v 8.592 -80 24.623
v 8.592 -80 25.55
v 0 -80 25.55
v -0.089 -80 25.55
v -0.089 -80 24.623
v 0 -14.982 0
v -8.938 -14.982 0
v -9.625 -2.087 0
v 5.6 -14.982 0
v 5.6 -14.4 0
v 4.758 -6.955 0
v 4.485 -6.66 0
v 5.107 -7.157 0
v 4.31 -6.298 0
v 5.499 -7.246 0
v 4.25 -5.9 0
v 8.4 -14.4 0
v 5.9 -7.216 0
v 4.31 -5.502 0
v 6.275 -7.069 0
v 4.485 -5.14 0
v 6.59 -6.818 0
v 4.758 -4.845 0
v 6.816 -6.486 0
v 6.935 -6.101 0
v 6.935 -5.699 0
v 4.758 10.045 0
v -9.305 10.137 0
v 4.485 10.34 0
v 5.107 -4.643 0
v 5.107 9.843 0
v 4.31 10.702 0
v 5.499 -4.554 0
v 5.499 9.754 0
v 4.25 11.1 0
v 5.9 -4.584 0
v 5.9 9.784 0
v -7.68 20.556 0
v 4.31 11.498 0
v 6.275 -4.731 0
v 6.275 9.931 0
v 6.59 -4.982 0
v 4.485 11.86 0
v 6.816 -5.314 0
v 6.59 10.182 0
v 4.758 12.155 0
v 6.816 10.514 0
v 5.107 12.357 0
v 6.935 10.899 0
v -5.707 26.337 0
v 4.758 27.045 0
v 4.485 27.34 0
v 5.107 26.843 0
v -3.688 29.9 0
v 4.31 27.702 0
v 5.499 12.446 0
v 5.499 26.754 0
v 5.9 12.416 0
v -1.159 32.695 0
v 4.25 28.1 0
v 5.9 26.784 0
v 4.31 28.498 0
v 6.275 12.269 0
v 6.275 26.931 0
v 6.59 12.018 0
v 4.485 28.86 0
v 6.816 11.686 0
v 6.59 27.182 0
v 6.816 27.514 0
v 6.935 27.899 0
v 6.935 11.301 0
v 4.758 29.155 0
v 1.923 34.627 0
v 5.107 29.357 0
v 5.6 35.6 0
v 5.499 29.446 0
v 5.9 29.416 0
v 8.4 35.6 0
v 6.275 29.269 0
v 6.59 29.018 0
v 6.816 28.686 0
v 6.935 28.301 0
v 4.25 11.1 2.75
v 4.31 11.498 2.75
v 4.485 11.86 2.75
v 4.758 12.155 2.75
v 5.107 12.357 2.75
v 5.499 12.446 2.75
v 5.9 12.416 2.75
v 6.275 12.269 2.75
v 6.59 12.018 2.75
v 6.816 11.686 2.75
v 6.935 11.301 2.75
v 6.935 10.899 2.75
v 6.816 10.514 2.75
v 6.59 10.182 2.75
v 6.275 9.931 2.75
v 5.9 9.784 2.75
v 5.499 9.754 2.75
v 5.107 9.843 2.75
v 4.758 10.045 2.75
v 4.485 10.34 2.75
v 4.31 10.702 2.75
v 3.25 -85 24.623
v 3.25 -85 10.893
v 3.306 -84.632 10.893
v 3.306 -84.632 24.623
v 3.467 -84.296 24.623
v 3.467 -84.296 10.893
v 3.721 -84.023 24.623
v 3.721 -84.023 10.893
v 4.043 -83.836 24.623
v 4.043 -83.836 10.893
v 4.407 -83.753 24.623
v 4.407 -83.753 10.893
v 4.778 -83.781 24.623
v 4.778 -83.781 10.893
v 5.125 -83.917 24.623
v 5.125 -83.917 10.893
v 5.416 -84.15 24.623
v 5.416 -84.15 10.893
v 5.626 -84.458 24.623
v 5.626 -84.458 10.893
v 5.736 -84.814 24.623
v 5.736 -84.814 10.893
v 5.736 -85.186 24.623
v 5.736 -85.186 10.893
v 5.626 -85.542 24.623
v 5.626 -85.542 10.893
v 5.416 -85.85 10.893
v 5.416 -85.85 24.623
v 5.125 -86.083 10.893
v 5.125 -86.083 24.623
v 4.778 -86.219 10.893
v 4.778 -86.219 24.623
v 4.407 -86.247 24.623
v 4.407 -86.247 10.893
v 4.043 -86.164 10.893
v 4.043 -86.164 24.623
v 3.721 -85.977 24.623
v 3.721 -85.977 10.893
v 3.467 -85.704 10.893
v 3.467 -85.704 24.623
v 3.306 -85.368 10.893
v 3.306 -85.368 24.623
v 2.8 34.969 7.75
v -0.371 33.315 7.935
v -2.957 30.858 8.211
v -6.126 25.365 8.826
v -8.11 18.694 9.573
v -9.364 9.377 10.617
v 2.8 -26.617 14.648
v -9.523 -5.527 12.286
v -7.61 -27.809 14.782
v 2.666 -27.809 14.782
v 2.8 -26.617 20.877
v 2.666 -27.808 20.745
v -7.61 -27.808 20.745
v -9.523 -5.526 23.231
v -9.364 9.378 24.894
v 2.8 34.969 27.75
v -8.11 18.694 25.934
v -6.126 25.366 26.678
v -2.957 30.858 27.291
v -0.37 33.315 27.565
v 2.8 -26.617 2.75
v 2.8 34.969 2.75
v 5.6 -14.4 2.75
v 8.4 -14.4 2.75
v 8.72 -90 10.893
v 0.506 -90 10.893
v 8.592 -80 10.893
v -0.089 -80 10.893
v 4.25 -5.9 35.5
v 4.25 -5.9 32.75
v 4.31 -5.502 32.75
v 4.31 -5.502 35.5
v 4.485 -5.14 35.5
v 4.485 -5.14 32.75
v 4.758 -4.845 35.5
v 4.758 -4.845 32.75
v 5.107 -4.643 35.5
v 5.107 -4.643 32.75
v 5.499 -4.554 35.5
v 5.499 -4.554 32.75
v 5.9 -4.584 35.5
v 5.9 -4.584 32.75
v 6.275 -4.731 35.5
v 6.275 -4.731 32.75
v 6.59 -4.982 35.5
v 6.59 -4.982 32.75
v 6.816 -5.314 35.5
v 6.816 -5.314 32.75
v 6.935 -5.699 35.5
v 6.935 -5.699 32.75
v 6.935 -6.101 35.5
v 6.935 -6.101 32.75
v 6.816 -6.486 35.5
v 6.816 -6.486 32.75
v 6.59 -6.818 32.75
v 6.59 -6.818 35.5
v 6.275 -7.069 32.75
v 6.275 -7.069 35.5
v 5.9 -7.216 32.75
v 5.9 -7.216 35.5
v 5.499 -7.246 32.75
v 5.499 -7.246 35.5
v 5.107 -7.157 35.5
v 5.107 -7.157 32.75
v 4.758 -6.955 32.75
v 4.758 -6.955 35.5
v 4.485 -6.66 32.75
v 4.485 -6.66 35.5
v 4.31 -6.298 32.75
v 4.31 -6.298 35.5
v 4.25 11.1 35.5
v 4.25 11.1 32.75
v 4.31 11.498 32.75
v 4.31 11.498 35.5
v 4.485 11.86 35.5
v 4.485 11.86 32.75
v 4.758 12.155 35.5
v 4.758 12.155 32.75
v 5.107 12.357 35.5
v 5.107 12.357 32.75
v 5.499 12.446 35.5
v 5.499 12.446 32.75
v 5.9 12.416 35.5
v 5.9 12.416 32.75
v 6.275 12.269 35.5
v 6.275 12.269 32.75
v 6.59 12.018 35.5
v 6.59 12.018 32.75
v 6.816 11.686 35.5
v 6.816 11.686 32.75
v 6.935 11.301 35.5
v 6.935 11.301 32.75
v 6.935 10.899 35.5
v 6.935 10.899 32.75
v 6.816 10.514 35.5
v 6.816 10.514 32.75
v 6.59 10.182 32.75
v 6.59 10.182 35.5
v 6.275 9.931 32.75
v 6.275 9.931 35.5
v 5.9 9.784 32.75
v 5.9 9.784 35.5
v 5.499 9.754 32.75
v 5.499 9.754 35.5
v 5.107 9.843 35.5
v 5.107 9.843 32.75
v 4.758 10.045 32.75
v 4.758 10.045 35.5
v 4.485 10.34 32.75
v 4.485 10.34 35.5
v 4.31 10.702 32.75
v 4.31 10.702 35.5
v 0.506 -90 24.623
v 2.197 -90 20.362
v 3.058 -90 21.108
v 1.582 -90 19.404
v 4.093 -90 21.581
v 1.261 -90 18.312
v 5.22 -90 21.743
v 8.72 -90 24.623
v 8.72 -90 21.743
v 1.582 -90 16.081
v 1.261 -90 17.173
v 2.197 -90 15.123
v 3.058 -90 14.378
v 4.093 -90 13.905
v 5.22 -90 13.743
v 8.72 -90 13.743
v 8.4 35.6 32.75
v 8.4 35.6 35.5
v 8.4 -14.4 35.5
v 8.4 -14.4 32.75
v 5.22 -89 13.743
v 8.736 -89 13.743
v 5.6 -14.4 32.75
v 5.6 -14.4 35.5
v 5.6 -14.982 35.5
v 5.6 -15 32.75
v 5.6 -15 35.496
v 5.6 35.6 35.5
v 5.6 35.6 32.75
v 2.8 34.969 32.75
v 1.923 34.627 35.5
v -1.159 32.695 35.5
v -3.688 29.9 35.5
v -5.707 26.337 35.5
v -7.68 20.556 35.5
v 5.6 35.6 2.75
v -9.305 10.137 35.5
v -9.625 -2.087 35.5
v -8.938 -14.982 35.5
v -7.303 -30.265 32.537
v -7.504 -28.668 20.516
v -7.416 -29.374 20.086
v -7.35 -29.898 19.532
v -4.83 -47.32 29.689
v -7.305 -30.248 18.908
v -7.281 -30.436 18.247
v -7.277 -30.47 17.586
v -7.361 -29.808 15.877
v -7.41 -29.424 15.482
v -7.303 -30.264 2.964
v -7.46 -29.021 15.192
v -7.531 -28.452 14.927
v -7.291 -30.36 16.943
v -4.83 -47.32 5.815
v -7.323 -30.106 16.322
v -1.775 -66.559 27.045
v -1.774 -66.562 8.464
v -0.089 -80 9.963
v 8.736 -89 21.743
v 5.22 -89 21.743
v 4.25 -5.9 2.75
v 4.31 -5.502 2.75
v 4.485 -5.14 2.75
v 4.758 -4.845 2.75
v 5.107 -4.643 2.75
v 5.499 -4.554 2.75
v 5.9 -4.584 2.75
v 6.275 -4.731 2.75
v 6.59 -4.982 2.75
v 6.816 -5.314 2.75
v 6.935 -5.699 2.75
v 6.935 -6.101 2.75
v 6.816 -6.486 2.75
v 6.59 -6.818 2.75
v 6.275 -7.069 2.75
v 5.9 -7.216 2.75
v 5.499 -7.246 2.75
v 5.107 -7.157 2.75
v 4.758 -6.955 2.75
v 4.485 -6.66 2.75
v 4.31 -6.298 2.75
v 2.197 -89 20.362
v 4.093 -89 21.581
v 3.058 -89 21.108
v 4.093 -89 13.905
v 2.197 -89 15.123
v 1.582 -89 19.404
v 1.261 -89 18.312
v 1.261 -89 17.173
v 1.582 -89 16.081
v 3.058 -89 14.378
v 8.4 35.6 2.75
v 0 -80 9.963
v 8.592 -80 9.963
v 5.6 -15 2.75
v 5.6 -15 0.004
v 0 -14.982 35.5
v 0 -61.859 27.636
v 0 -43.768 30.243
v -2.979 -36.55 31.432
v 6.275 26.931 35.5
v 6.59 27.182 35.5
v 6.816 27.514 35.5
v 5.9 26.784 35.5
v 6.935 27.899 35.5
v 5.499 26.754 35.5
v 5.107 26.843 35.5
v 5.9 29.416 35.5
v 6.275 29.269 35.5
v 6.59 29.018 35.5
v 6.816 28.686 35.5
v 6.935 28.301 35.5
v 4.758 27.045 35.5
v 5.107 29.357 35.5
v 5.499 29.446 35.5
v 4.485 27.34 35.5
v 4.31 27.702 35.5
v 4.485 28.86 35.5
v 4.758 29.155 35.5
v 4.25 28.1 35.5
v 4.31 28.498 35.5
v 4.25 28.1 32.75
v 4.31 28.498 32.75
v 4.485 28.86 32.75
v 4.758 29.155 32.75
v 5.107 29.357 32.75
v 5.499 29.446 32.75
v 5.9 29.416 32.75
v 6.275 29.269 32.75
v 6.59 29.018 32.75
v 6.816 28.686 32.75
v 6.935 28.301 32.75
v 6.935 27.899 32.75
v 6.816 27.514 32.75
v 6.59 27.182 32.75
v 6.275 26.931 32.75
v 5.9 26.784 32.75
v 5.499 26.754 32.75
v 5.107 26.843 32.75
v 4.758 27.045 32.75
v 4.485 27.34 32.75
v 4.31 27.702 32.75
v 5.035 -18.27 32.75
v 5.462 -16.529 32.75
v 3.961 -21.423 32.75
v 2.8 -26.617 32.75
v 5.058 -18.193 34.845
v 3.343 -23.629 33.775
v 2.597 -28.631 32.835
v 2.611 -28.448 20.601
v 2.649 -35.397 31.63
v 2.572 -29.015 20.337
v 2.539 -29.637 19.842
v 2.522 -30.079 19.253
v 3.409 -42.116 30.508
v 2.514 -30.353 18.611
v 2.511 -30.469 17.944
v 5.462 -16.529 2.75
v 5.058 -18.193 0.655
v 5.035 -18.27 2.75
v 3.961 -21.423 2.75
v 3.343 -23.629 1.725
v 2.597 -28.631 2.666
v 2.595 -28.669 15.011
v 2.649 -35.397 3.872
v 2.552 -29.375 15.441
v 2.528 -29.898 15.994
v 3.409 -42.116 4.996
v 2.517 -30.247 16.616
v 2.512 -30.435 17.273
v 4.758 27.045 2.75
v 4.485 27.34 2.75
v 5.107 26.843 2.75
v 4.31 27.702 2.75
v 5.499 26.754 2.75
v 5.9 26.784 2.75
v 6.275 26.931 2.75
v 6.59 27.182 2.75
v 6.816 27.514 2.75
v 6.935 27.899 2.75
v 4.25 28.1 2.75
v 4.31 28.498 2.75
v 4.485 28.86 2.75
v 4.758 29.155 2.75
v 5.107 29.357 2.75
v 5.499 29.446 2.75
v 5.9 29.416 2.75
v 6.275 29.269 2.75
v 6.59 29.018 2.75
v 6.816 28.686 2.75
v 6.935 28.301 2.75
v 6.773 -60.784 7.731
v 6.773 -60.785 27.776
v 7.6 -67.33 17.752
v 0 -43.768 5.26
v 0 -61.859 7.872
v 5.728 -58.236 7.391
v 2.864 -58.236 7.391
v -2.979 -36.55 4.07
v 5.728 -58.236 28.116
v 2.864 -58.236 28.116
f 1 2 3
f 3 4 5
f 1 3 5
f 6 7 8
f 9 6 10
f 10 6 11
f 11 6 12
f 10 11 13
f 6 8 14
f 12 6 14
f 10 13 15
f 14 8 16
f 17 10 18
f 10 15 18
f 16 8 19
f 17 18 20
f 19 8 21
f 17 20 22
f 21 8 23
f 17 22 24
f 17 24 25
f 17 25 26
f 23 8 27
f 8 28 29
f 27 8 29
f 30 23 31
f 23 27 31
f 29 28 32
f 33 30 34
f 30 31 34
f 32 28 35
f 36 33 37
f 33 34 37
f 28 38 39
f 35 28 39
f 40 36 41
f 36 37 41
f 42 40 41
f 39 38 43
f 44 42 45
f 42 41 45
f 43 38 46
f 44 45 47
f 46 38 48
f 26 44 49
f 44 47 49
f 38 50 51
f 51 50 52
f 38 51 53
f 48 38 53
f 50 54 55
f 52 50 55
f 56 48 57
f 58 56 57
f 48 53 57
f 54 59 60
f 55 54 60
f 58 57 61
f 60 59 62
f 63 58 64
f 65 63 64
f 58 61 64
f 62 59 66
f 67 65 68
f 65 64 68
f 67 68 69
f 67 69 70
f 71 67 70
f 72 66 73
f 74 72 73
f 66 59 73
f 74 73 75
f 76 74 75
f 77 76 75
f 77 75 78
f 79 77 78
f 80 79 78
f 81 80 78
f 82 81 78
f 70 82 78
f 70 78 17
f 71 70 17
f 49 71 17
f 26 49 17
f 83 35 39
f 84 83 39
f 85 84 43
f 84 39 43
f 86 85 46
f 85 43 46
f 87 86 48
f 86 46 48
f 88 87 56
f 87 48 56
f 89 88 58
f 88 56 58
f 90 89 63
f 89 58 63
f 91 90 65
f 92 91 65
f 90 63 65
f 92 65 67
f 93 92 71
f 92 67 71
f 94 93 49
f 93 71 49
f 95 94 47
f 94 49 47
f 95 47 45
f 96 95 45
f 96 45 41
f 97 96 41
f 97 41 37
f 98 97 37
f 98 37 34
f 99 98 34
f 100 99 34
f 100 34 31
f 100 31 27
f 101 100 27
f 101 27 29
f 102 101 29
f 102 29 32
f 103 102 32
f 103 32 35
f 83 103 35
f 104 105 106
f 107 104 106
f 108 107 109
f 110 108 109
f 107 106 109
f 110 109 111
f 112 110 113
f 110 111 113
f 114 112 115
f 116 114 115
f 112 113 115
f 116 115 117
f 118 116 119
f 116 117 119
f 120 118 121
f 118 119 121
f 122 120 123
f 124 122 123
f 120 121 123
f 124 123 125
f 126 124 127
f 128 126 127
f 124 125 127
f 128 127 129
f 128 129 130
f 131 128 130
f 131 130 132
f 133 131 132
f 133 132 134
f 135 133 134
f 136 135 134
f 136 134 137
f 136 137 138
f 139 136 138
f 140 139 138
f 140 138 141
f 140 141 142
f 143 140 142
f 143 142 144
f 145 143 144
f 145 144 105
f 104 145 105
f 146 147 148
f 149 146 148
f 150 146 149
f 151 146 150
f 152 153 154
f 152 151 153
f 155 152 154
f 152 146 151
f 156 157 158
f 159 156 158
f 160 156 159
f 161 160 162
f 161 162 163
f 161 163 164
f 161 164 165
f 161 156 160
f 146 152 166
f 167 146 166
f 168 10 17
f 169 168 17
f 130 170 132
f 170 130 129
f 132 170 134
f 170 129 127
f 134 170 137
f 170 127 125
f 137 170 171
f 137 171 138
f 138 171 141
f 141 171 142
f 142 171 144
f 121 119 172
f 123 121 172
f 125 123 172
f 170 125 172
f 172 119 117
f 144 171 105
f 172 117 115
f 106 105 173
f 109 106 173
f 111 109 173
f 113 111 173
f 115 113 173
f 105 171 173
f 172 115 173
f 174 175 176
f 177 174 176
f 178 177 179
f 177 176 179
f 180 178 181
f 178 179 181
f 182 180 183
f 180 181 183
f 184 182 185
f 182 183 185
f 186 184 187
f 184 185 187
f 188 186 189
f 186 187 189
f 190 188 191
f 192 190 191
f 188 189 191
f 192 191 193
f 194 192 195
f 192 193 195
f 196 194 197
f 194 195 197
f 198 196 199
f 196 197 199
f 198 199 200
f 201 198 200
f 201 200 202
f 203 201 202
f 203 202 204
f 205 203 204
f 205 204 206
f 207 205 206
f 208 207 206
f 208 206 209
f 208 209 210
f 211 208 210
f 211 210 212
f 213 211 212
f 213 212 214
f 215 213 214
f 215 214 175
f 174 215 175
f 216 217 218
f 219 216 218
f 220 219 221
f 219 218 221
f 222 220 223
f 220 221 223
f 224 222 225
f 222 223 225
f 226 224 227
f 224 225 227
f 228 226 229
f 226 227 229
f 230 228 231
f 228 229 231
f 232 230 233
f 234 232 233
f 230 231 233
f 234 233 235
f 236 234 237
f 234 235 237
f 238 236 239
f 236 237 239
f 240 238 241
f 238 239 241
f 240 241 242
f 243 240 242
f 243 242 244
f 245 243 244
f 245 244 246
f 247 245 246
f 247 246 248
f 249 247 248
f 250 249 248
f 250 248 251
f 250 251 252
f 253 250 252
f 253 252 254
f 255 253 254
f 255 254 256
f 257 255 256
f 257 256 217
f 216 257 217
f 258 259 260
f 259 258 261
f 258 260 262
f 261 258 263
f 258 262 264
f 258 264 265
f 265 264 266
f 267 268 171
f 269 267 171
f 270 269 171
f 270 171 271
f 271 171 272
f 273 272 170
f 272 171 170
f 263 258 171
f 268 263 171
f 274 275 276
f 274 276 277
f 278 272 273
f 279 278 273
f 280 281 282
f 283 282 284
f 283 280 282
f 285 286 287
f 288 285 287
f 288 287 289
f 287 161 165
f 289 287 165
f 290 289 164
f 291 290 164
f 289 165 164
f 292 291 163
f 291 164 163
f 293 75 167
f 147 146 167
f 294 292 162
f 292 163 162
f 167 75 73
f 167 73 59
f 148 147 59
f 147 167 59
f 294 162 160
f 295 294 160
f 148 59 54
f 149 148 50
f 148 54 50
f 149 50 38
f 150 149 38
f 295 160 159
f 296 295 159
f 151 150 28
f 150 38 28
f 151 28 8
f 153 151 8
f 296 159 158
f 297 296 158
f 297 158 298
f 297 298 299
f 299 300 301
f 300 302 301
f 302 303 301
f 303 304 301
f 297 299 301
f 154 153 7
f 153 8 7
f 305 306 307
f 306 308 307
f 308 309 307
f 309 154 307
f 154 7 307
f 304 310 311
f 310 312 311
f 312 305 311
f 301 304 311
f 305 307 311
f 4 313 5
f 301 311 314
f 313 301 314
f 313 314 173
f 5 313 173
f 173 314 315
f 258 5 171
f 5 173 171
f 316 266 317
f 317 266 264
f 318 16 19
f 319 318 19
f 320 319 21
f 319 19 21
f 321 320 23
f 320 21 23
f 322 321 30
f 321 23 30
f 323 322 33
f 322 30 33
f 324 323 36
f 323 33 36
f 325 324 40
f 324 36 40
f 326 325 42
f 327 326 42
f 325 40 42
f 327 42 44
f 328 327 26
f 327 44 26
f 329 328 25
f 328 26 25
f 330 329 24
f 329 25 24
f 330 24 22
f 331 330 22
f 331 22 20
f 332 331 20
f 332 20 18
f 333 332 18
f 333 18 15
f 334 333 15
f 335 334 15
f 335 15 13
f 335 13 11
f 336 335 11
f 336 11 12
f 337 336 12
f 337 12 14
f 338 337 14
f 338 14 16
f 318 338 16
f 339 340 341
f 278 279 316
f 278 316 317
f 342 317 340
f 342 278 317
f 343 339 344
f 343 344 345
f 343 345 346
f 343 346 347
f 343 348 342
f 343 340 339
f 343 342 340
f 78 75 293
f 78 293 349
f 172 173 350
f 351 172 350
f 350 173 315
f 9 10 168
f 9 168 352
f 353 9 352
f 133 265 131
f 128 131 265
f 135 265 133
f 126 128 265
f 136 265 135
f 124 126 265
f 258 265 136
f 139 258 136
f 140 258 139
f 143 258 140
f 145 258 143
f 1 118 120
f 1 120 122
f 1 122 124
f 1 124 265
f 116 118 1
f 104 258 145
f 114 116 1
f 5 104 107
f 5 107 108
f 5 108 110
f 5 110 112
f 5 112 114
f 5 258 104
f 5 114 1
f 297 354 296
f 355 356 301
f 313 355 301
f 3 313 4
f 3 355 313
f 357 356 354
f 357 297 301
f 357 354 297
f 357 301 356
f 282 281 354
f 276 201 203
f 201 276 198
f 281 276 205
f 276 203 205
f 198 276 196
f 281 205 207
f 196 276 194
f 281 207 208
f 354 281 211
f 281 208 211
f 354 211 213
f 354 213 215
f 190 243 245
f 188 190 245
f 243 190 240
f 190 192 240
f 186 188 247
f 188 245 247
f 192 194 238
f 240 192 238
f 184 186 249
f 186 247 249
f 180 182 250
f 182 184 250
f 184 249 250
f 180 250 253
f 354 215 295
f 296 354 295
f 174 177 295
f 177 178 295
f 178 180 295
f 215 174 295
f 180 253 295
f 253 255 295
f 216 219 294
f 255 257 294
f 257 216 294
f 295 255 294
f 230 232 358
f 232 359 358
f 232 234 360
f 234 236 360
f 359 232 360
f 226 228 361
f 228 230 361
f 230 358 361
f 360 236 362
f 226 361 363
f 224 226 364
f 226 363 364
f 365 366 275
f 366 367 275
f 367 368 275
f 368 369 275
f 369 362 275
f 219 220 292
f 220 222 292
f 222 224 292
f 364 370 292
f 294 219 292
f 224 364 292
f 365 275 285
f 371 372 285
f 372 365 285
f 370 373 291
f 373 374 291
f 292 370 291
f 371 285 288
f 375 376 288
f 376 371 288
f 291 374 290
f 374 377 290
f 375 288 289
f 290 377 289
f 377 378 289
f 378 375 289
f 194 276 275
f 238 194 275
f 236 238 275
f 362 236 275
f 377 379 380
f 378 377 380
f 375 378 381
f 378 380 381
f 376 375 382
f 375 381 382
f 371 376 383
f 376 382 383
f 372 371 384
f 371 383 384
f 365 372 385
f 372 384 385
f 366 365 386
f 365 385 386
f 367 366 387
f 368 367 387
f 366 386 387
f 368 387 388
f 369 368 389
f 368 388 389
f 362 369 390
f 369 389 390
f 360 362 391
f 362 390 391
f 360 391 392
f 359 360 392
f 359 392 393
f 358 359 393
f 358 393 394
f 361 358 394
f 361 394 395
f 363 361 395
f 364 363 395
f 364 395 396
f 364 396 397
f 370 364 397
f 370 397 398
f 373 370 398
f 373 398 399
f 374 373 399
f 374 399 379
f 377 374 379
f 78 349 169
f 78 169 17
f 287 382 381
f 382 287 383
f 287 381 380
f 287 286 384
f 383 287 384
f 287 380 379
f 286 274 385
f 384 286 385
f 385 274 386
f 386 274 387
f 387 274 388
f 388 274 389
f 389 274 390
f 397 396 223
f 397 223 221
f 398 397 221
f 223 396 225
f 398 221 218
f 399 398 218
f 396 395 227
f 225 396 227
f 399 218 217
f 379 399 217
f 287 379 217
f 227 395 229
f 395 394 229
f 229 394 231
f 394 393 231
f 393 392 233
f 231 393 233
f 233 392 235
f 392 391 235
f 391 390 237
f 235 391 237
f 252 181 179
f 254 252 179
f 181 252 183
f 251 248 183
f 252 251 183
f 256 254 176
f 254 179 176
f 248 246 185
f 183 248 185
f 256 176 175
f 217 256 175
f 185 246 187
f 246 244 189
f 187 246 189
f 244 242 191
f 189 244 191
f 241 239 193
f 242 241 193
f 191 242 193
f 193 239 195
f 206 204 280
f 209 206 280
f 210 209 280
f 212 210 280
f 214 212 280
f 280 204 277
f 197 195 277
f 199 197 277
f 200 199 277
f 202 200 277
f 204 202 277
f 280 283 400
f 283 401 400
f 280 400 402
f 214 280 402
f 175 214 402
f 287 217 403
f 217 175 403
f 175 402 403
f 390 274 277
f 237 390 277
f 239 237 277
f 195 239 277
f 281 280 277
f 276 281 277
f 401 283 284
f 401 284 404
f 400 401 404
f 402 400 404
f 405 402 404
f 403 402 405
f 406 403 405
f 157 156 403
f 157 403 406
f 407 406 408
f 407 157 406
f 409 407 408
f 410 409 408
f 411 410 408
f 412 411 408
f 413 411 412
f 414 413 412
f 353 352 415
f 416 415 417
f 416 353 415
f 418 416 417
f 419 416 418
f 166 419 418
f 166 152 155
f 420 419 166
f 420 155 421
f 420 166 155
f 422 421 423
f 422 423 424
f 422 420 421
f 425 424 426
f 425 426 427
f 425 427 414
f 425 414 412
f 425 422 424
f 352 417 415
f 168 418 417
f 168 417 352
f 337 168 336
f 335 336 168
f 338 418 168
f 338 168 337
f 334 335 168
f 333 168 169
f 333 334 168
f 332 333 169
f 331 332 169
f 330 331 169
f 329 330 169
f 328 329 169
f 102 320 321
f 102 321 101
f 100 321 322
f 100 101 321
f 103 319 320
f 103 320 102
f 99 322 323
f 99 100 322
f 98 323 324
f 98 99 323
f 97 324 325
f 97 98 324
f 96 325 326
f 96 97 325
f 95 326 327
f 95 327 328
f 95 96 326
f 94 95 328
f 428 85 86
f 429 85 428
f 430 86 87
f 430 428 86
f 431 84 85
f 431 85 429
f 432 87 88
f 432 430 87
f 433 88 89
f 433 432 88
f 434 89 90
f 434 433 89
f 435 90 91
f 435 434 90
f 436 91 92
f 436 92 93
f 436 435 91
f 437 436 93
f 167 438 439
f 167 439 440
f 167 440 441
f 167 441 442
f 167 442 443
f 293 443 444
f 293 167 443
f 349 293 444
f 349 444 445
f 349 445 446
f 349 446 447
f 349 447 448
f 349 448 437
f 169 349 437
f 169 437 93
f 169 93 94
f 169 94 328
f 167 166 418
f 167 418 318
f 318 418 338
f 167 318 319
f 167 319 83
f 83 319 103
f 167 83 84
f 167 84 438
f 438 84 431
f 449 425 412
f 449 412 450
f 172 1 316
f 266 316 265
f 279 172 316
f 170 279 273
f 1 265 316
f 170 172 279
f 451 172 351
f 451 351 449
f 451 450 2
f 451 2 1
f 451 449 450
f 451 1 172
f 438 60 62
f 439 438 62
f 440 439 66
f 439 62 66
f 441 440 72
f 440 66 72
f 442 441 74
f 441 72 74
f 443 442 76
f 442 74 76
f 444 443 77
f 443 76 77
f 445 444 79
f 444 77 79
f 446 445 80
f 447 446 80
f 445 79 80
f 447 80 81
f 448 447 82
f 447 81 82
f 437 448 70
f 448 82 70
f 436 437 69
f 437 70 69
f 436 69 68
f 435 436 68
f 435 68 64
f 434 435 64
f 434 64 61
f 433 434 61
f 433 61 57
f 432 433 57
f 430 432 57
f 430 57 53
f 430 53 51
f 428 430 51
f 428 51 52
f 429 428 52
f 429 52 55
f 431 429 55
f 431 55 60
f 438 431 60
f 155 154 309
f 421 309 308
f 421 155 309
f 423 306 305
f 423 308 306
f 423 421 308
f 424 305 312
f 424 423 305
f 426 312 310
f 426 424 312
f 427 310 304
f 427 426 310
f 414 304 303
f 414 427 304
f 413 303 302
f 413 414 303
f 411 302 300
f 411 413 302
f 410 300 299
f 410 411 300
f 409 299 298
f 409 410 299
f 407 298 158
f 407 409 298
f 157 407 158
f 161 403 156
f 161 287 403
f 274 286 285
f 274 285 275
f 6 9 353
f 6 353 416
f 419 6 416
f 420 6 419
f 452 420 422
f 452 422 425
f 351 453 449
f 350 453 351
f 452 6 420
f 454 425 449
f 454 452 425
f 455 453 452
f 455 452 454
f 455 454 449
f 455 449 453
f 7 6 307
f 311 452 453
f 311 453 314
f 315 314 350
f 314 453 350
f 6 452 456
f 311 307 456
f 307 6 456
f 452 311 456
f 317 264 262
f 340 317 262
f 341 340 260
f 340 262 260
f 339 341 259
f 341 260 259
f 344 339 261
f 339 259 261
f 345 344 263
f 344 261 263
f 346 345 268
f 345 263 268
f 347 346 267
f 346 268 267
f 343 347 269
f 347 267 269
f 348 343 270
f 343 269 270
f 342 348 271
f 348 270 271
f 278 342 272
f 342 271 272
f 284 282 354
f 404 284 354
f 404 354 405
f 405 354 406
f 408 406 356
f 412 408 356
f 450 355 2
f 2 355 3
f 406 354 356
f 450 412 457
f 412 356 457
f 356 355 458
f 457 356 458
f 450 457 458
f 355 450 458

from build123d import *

# Parameters (mm, degrees)
BOSS_EXTRUDE2_DEPTH        = 35.5
CUT_EXTRUDE1_DEPTH         = 17.75
CUT_EXTRUDE2_DEPTH         = 2.8
SKETCH5_W                  = 2.8
SKETCH5_H                  = 2.75
BOSS_EXTRUDE3_DEPTH        = 50
CUT_EXTRUDE3_DEPTH         = 15
F_2_7_2_7_DIAMETER_HOLE1_D = 2.7
M3_TAPPED_HOLE1_D          = 2.5
CUT_EXTRUDE4_DEPTH         = 126.902937834
CUT_EXTRUDE4_DEPTH_BACK    = 126.902937834
SKETCH12_W                 = 1.496855304
SKETCH12_H                 = 10
SKETCH12_W_2               = 1.571931937
CUT_EXTRUDE5_DEPTH         = 20
CUT_EXTRUDE6_DEPTH         = 1


with BuildPart() as part:
    # Sketch1 → Boss-Extrude2 (new body)
    with BuildSketch(Plane.XY):
        with BuildLine():
            Line((5.6, 35.6), (5.6, -15))
            add(Edge.make_bspline(
                [(5.6, -15), (5.6, -17.274393969), (1.604195195, -25.847964508), (2.415841027, -35.113621235), (3.409417942, -42.11611418)],
                knots=[0, 0, 0, 0, 0.227789152, 0.921500182, 0.921500182, 0.921500182, 0.921500182], degree=3))
            add(Edge.make_bspline(
                [(3.409417942, -42.11611418), (14.021423643, -91.198515752), (3.540705721, -122.805120936)],
                knots=[0, 0, 0, 1, 1, 1], degree=2))
            Line((3.540705721, -122.805120936), (-4.088116427, -120.408076375))
            add(Edge.make_bspline(
                [(5.6, 35.6), (-12.367874994, 33.521263174), (-8.7823866, -50.782642202), (5.954211422, -91.451497422), (-4.088116427, -120.408076375)],
                knots=[0, 0, 0, 0, 0.40530679, 1, 1, 1, 1], degree=3))
        make_face()
    extrude(amount=BOSS_EXTRUDE2_DEPTH)

    # Sketch3 → Cut-Extrude1 (cut, symmetric)
    with BuildSketch(Plane(origin=(0, 0, 0), x_dir=(0, 0, -1), z_dir=(1, 0, 0))):
        with BuildLine():
            Line((0, -14.98237842), (29.62736343, -14.98237842))
            Line((29.62736343, -14.98237842), (29.62736343, -131.572481325))
            Line((29.62736343, -131.572481325), (-60.547074518, -131.572481325))
            Line((-60.547074518, -131.572481325), (-60.547074518, -14.98237842))
            Line((-60.547074518, -14.98237842), (-35.5, -14.98237842))
            add(Edge.make_bspline(
                [(-35.5, -14.98237842), (-28.308780975, -49.75857776), (-24.077993602, -85.166412163), (-22.769212626, -120.408076375)],
                knots=[0, 0, 0, 0, 1, 1, 1, 1], degree=3))
            Line((-22.769212626, -120.408076375), (-12.75, -120.408076375))
            add(Edge.make_bspline(
                [(0, -14.98237842), (-7.191219025, -49.75857776), (-11.441219025, -85.166412163), (-12.75, -120.408076375)],
                knots=[0, 0, 0, 0, 1, 1, 1, 1], degree=3))
        make_face()
    extrude(amount=CUT_EXTRUDE1_DEPTH, both=True, mode=Mode.SUBTRACT)

    # Sketch4 → Cut-Extrude2 (cut)
    with BuildSketch(Plane(origin=(5.6, 0, 0), x_dir=(0, 0, -1), z_dir=(1, 0, 0))):
        Polygon((-2.75, 35.6), (-32.75, 35.6), (-32.75, -15.000000007), (-32.75, -32.018147114), (-2.75, -32.018147114), (-2.75, -15.000000007), align=None)
    extrude(amount=-CUT_EXTRUDE2_DEPTH, mode=Mode.SUBTRACT)

    # Sketch5 → Boss-Extrude3 (add)
    with BuildSketch(Plane(origin=(0, 35.6, 0), x_dir=(1, 0, 0), z_dir=(0, 1, 0))):
        with Locations((7, -1.375)):
            Rectangle(SKETCH5_W, SKETCH5_H)
        with Locations((7, -34.125)):
            Rectangle(SKETCH5_W, SKETCH5_H)
    extrude(amount=-BOSS_EXTRUDE3_DEPTH)

    # Sketch6 → Cut-Extrude3 (cut, symmetric)
    with BuildSketch(Plane(origin=(0, 0, 0), x_dir=(0, 0, -1), z_dir=(1, 0, 0))):
        with BuildLine():
            Line((-7.75, 34.96933844), (-14.781773193, -27.808788024))
            ThreePointArc((-14.781773193, -27.808788024), (-17.763748777, -30.474846509), (-20.744622729, -27.807556366))
            Line((-20.744622729, -27.807556366), (-27.75, 34.96933844))
            Line((-27.75, 34.96933844), (-7.75, 34.96933844))
        make_face()
    extrude(amount=CUT_EXTRUDE3_DEPTH, both=True, mode=Mode.SUBTRACT)

    # Ø2.7 (2.7) Diameter Hole1 (through all)
    with Locations(Plane.XY.offset(35.5)):
        with Locations((5.6, 28.1), (5.6, 11.1), (5.6, -5.9)):
            Hole(F_2_7_2_7_DIAMETER_HOLE1_D / 2)

    # M3 Tapped Hole1 (through all)
    with Locations(Plane.XY.offset(35.5)):
        with Locations((4.5, -85)):
            Hole(M3_TAPPED_HOLE1_D / 2)

    # Sketch12 → Cut-Extrude4 (cut, two sides: drawn at the far end of the back side and taken through both)
    with BuildSketch(Plane(origin=(0, 0, 0), x_dir=(0, 0, -1), z_dir=(1, 0, 0)).offset(-CUT_EXTRUDE4_DEPTH_BACK)):
        with Locations((-10.144277768, -85)):
            Rectangle(SKETCH12_W, SKETCH12_H)
        with Locations((-25.408624424, -85)):
            Rectangle(SKETCH12_W_2, SKETCH12_H)
    extrude(amount=CUT_EXTRUDE4_DEPTH + CUT_EXTRUDE4_DEPTH_BACK, mode=Mode.SUBTRACT)

    # Sketch14 → Cut-Extrude5 (cut)
    with BuildSketch(Plane(origin=(0, 0, 10.89270542), x_dir=(-1, 0, 0), z_dir=(0, 0, -1))):
        Polygon((-8.720315384, -90), (6.272671273, -90), (6.272671273, -124.093634091), (-10.541100015, -124.093634091), (-10.541100015, -90), align=None)
    extrude(amount=-CUT_EXTRUDE5_DEPTH, mode=Mode.SUBTRACT)

    # Sketch15 → Cut-Extrude6 (cut)
    with BuildSketch(Plane(origin=(0, -90, 0), x_dir=(-1, 0, 0), z_dir=(0, -1, 0))):
        with BuildLine():
            Line((-5.220315384, -13.74270542), (-8.720315384, -13.74270542))
            Line((-8.720315384, -13.74270542), (-9.623354914, -13.74270542))
            Line((-9.623354914, -13.74270542), (-9.623354914, -21.74270542))
            Line((-9.623354914, -21.74270542), (-5.220315384, -21.74270542))
            ThreePointArc((-5.220315384, -21.74270542), (-1.220315384, -17.74270542), (-5.220315384, -13.74270542))
        make_face()
    extrude(amount=-CUT_EXTRUDE6_DEPTH, mode=Mode.SUBTRACT)


solid = part.part
